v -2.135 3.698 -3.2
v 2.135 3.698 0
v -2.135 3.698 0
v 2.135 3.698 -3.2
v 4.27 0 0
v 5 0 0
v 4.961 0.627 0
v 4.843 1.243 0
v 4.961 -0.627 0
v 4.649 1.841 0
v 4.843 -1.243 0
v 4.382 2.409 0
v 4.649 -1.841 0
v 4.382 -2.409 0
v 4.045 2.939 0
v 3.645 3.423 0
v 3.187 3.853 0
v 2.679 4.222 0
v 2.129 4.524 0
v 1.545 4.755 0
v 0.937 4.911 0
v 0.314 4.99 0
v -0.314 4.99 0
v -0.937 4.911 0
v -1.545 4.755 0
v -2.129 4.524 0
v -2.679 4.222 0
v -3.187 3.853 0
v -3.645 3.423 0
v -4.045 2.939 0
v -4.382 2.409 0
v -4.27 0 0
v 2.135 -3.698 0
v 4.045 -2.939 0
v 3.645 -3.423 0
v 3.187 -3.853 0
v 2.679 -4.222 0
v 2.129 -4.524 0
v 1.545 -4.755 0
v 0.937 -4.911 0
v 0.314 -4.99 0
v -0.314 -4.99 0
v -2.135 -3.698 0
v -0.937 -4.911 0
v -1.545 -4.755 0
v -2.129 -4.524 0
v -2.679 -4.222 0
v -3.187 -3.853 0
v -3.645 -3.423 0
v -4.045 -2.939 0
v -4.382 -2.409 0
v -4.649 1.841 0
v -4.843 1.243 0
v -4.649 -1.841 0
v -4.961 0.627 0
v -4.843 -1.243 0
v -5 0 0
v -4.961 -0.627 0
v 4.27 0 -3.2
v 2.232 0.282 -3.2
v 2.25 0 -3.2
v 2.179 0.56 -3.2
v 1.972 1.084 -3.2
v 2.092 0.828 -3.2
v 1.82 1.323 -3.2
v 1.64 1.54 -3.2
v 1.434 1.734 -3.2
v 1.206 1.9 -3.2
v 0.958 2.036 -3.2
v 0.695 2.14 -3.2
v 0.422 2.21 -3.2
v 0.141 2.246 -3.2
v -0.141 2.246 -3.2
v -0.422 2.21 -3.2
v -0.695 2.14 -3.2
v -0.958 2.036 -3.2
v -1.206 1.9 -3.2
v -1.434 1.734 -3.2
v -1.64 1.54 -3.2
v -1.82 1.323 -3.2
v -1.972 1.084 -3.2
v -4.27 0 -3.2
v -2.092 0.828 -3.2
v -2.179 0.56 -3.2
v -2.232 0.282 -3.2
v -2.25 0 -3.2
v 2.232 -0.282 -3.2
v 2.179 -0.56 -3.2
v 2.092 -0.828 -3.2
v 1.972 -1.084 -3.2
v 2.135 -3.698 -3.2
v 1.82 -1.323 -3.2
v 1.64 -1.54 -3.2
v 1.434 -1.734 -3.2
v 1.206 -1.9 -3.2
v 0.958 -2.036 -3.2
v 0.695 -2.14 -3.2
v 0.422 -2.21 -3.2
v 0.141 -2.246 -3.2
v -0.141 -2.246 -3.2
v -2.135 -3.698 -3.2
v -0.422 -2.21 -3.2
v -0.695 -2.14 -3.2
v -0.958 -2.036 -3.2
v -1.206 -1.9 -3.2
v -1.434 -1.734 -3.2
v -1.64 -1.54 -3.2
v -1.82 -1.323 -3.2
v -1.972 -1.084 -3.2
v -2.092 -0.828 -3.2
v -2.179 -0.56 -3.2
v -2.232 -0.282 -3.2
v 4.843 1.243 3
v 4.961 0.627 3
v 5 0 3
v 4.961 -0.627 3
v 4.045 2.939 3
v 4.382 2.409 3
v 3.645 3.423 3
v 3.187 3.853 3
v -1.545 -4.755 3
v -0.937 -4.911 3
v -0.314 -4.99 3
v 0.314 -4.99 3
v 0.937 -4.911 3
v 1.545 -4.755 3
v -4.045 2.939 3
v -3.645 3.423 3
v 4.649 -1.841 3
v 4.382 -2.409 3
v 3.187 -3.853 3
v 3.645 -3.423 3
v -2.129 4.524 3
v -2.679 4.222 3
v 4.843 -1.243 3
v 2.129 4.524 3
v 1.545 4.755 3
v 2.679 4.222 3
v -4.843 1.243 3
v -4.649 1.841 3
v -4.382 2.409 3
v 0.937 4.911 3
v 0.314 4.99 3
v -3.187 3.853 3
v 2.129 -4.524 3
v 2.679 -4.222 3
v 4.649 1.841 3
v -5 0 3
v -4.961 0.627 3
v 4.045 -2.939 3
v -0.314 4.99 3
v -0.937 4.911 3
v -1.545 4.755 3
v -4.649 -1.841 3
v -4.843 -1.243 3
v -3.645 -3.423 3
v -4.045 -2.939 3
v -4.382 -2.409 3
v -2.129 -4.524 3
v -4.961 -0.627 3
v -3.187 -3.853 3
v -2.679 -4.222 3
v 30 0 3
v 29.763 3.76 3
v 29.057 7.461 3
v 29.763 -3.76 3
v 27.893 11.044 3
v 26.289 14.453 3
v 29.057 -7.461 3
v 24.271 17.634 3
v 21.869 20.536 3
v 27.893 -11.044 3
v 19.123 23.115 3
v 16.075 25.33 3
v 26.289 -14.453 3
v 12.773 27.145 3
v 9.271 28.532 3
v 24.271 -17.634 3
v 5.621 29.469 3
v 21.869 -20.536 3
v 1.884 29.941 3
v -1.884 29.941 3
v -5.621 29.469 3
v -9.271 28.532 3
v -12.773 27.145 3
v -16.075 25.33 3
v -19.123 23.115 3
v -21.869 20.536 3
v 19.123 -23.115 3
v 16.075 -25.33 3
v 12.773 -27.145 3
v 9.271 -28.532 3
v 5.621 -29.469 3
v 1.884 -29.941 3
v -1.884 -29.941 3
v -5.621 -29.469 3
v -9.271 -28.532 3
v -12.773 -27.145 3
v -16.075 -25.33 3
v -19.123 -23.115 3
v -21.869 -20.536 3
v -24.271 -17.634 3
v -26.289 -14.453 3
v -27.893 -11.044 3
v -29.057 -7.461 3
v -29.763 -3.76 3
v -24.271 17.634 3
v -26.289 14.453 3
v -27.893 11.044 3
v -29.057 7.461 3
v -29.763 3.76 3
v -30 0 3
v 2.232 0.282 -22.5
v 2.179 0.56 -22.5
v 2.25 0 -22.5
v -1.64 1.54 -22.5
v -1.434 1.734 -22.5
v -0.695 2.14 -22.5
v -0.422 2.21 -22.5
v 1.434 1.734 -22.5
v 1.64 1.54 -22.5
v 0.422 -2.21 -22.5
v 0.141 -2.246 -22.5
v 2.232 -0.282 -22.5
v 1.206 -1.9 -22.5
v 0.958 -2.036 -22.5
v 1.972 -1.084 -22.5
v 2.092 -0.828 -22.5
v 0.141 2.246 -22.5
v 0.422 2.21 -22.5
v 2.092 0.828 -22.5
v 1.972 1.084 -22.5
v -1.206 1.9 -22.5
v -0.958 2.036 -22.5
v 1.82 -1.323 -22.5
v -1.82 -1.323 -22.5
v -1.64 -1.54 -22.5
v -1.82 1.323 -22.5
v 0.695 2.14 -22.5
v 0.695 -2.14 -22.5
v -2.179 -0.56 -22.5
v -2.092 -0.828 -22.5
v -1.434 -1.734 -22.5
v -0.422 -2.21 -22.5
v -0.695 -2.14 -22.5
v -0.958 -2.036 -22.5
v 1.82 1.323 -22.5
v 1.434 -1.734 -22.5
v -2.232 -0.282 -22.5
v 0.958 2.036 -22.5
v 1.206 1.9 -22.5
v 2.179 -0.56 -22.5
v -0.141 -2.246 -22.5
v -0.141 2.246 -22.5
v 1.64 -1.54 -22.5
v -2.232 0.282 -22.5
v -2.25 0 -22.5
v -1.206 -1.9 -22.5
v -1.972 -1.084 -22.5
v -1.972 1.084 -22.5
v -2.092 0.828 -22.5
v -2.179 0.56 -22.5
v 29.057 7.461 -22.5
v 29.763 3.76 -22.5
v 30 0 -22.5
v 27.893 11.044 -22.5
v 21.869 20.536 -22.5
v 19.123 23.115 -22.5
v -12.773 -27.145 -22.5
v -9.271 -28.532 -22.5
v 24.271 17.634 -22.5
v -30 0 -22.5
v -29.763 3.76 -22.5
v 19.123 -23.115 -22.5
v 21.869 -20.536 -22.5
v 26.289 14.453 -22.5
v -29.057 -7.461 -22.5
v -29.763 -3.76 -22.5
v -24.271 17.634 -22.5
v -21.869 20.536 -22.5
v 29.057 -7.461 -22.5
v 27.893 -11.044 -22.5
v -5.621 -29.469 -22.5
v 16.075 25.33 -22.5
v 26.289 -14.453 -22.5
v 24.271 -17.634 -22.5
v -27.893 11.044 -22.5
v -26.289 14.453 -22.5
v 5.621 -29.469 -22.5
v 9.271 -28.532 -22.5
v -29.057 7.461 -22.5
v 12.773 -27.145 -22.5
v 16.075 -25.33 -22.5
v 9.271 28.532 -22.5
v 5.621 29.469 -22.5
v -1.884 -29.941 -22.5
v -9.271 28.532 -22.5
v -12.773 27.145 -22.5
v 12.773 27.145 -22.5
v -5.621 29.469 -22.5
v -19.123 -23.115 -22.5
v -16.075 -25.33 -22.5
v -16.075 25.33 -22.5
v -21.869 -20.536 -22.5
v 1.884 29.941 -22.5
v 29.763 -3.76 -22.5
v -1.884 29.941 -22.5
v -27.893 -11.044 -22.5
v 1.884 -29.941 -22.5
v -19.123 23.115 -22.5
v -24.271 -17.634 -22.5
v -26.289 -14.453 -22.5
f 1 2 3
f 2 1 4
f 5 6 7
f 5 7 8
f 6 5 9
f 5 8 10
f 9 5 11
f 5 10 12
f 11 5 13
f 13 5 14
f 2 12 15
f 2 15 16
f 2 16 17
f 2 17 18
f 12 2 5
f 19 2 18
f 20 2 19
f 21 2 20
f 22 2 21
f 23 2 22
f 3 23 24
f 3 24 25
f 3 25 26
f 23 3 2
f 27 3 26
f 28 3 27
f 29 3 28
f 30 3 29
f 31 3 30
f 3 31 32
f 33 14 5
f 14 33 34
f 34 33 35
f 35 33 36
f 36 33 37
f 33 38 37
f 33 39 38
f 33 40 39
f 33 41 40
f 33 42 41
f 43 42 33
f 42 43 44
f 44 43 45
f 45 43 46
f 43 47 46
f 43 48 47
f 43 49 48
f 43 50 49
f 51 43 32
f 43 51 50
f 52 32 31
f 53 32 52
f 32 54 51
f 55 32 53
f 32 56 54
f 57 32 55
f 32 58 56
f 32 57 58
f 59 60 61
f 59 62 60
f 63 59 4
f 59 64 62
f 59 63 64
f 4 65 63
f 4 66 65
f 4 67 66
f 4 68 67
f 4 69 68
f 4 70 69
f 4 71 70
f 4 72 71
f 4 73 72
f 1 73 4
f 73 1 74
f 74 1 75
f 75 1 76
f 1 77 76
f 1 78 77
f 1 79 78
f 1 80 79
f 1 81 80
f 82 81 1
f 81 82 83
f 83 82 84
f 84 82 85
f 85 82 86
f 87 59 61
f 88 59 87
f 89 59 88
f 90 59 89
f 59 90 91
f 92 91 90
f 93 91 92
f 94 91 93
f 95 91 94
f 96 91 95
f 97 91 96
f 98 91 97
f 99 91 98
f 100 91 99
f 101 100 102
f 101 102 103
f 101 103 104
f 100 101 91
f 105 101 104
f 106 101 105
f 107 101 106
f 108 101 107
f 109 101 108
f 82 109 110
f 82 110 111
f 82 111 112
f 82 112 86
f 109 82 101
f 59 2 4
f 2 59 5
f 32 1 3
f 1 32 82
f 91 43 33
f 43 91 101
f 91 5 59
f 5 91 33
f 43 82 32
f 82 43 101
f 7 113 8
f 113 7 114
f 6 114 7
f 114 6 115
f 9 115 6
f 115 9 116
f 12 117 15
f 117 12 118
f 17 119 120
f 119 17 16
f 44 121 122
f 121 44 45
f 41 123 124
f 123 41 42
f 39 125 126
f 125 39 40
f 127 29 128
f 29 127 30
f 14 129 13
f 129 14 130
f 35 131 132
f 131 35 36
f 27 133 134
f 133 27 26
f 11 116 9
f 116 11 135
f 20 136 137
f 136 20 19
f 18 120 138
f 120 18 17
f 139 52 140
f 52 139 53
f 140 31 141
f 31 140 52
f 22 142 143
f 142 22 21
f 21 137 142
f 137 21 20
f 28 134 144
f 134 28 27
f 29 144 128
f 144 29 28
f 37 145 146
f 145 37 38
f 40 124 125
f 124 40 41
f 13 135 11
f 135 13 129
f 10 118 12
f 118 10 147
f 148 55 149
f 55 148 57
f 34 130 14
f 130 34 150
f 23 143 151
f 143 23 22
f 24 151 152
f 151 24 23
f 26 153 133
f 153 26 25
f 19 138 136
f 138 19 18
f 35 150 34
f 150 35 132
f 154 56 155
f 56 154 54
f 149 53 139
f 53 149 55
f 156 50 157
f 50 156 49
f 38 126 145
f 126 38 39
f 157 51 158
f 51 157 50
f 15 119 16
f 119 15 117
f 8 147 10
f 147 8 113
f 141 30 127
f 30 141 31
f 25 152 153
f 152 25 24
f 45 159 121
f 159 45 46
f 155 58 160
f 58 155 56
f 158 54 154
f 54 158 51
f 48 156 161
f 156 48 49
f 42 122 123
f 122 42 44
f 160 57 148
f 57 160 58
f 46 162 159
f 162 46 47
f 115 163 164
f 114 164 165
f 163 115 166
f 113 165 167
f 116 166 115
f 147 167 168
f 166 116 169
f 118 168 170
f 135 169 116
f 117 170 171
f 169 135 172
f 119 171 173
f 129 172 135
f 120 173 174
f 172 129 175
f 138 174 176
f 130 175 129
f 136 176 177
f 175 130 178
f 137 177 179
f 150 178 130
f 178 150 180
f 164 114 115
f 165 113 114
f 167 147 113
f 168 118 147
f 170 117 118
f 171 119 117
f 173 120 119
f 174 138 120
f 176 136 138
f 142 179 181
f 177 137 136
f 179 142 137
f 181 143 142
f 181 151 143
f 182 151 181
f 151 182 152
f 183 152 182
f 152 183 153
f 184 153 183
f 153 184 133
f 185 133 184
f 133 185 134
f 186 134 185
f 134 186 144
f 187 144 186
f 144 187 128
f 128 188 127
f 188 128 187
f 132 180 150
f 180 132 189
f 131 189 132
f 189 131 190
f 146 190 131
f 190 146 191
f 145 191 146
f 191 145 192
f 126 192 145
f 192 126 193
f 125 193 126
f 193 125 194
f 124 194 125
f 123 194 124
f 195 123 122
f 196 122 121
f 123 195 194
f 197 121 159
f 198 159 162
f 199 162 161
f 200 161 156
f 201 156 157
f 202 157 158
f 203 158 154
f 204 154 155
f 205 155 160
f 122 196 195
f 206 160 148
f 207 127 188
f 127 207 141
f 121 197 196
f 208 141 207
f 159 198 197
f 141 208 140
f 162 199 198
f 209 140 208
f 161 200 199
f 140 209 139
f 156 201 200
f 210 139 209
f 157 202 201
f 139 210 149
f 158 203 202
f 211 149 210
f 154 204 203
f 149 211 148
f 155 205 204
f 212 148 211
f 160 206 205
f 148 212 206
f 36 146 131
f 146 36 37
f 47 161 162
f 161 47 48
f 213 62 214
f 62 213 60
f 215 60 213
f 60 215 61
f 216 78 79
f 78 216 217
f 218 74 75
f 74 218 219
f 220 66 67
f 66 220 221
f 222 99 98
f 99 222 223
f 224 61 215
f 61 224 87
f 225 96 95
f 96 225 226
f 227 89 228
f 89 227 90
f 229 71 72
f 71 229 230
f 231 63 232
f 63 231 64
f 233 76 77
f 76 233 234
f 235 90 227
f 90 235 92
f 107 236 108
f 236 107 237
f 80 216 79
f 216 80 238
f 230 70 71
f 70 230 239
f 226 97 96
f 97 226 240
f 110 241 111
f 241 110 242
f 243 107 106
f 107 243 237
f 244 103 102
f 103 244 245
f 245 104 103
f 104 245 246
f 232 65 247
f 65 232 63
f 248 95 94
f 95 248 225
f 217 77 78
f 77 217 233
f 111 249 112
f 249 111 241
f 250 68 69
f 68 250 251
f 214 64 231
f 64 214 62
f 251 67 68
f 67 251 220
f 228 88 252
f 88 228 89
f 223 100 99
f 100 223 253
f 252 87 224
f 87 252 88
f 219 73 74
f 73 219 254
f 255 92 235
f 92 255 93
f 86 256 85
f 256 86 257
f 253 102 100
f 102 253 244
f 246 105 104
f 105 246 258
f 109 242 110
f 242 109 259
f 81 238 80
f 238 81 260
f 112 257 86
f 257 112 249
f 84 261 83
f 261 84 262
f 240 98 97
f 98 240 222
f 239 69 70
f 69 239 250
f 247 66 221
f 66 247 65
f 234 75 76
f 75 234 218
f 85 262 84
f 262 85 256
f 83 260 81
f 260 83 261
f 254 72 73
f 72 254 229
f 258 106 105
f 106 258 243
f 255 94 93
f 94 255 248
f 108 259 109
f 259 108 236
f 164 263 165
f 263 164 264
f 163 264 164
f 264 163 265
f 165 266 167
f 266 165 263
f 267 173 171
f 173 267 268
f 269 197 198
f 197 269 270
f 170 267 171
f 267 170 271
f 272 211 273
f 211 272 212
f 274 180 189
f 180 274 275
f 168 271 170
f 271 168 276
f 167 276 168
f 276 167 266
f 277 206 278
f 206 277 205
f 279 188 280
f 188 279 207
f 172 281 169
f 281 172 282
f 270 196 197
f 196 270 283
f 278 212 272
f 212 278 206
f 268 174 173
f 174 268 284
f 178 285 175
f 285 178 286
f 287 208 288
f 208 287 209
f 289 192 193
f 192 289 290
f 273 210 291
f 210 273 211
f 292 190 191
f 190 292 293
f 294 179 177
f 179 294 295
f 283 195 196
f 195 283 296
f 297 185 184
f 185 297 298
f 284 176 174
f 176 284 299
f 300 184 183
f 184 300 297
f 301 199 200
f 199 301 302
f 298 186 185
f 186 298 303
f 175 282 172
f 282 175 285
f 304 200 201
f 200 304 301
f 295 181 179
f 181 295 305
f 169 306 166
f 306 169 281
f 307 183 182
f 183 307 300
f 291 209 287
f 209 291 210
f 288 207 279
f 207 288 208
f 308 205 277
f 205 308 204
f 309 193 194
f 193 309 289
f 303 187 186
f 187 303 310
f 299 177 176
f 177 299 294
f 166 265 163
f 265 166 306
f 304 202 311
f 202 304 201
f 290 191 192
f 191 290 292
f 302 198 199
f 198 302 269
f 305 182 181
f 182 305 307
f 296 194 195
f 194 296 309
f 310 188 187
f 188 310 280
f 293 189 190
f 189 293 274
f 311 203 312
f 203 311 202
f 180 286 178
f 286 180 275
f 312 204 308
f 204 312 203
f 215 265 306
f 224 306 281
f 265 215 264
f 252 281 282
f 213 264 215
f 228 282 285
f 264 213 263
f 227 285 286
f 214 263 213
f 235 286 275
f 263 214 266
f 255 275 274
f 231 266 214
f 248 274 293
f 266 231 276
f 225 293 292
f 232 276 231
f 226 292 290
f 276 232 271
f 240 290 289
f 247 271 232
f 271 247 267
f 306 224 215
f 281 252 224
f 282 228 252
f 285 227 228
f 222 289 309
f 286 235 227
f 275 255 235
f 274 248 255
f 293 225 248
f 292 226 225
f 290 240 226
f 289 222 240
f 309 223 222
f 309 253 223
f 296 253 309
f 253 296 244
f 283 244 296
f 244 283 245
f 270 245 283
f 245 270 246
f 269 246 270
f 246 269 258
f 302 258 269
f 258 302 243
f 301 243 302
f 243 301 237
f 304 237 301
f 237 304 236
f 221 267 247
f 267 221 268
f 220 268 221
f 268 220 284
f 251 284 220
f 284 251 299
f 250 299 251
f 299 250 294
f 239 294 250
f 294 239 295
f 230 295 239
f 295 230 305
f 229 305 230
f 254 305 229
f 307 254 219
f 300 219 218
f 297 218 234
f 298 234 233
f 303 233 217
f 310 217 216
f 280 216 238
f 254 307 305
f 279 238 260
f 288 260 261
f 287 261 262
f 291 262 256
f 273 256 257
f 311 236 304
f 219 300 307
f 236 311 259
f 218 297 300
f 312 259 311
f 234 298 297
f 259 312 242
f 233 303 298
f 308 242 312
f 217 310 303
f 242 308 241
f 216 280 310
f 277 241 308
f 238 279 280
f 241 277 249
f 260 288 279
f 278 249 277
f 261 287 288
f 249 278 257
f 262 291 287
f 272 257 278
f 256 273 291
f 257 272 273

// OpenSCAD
$fn = 50;

difference() {
	union() {
		translate(v = [0, 0, -22.5]) {
			cylinder(h = 25.5, r = 30.0);
		}
	}
	union() {
		translate(v = [0, 0, 0]) {
			rotate(a = [0, 0, 0]) {
				difference() {
					union() {
						translate(v = [0, 0, -3.2]) {
							linear_extrude(height = 3.2) {
								polygon(points = [[4.2698, 0.0], [2.1349000000000005, 3.697755269078796], [-2.134899999999999, 3.6977552690787965], [-4.2698, 5.228996902999369e-16], [-2.134900000000002, -3.6977552690787956], [2.1348999999999974, -3.697755269078798]]);
							}
						}
					}
					union();
				}
			}
		}
		#cylinder(h = 3, r = 5.0);
		#translate(v = [0, 0, -100.0]) {
			cylinder(h = 200, r = 2.25);
		}
	}
}
